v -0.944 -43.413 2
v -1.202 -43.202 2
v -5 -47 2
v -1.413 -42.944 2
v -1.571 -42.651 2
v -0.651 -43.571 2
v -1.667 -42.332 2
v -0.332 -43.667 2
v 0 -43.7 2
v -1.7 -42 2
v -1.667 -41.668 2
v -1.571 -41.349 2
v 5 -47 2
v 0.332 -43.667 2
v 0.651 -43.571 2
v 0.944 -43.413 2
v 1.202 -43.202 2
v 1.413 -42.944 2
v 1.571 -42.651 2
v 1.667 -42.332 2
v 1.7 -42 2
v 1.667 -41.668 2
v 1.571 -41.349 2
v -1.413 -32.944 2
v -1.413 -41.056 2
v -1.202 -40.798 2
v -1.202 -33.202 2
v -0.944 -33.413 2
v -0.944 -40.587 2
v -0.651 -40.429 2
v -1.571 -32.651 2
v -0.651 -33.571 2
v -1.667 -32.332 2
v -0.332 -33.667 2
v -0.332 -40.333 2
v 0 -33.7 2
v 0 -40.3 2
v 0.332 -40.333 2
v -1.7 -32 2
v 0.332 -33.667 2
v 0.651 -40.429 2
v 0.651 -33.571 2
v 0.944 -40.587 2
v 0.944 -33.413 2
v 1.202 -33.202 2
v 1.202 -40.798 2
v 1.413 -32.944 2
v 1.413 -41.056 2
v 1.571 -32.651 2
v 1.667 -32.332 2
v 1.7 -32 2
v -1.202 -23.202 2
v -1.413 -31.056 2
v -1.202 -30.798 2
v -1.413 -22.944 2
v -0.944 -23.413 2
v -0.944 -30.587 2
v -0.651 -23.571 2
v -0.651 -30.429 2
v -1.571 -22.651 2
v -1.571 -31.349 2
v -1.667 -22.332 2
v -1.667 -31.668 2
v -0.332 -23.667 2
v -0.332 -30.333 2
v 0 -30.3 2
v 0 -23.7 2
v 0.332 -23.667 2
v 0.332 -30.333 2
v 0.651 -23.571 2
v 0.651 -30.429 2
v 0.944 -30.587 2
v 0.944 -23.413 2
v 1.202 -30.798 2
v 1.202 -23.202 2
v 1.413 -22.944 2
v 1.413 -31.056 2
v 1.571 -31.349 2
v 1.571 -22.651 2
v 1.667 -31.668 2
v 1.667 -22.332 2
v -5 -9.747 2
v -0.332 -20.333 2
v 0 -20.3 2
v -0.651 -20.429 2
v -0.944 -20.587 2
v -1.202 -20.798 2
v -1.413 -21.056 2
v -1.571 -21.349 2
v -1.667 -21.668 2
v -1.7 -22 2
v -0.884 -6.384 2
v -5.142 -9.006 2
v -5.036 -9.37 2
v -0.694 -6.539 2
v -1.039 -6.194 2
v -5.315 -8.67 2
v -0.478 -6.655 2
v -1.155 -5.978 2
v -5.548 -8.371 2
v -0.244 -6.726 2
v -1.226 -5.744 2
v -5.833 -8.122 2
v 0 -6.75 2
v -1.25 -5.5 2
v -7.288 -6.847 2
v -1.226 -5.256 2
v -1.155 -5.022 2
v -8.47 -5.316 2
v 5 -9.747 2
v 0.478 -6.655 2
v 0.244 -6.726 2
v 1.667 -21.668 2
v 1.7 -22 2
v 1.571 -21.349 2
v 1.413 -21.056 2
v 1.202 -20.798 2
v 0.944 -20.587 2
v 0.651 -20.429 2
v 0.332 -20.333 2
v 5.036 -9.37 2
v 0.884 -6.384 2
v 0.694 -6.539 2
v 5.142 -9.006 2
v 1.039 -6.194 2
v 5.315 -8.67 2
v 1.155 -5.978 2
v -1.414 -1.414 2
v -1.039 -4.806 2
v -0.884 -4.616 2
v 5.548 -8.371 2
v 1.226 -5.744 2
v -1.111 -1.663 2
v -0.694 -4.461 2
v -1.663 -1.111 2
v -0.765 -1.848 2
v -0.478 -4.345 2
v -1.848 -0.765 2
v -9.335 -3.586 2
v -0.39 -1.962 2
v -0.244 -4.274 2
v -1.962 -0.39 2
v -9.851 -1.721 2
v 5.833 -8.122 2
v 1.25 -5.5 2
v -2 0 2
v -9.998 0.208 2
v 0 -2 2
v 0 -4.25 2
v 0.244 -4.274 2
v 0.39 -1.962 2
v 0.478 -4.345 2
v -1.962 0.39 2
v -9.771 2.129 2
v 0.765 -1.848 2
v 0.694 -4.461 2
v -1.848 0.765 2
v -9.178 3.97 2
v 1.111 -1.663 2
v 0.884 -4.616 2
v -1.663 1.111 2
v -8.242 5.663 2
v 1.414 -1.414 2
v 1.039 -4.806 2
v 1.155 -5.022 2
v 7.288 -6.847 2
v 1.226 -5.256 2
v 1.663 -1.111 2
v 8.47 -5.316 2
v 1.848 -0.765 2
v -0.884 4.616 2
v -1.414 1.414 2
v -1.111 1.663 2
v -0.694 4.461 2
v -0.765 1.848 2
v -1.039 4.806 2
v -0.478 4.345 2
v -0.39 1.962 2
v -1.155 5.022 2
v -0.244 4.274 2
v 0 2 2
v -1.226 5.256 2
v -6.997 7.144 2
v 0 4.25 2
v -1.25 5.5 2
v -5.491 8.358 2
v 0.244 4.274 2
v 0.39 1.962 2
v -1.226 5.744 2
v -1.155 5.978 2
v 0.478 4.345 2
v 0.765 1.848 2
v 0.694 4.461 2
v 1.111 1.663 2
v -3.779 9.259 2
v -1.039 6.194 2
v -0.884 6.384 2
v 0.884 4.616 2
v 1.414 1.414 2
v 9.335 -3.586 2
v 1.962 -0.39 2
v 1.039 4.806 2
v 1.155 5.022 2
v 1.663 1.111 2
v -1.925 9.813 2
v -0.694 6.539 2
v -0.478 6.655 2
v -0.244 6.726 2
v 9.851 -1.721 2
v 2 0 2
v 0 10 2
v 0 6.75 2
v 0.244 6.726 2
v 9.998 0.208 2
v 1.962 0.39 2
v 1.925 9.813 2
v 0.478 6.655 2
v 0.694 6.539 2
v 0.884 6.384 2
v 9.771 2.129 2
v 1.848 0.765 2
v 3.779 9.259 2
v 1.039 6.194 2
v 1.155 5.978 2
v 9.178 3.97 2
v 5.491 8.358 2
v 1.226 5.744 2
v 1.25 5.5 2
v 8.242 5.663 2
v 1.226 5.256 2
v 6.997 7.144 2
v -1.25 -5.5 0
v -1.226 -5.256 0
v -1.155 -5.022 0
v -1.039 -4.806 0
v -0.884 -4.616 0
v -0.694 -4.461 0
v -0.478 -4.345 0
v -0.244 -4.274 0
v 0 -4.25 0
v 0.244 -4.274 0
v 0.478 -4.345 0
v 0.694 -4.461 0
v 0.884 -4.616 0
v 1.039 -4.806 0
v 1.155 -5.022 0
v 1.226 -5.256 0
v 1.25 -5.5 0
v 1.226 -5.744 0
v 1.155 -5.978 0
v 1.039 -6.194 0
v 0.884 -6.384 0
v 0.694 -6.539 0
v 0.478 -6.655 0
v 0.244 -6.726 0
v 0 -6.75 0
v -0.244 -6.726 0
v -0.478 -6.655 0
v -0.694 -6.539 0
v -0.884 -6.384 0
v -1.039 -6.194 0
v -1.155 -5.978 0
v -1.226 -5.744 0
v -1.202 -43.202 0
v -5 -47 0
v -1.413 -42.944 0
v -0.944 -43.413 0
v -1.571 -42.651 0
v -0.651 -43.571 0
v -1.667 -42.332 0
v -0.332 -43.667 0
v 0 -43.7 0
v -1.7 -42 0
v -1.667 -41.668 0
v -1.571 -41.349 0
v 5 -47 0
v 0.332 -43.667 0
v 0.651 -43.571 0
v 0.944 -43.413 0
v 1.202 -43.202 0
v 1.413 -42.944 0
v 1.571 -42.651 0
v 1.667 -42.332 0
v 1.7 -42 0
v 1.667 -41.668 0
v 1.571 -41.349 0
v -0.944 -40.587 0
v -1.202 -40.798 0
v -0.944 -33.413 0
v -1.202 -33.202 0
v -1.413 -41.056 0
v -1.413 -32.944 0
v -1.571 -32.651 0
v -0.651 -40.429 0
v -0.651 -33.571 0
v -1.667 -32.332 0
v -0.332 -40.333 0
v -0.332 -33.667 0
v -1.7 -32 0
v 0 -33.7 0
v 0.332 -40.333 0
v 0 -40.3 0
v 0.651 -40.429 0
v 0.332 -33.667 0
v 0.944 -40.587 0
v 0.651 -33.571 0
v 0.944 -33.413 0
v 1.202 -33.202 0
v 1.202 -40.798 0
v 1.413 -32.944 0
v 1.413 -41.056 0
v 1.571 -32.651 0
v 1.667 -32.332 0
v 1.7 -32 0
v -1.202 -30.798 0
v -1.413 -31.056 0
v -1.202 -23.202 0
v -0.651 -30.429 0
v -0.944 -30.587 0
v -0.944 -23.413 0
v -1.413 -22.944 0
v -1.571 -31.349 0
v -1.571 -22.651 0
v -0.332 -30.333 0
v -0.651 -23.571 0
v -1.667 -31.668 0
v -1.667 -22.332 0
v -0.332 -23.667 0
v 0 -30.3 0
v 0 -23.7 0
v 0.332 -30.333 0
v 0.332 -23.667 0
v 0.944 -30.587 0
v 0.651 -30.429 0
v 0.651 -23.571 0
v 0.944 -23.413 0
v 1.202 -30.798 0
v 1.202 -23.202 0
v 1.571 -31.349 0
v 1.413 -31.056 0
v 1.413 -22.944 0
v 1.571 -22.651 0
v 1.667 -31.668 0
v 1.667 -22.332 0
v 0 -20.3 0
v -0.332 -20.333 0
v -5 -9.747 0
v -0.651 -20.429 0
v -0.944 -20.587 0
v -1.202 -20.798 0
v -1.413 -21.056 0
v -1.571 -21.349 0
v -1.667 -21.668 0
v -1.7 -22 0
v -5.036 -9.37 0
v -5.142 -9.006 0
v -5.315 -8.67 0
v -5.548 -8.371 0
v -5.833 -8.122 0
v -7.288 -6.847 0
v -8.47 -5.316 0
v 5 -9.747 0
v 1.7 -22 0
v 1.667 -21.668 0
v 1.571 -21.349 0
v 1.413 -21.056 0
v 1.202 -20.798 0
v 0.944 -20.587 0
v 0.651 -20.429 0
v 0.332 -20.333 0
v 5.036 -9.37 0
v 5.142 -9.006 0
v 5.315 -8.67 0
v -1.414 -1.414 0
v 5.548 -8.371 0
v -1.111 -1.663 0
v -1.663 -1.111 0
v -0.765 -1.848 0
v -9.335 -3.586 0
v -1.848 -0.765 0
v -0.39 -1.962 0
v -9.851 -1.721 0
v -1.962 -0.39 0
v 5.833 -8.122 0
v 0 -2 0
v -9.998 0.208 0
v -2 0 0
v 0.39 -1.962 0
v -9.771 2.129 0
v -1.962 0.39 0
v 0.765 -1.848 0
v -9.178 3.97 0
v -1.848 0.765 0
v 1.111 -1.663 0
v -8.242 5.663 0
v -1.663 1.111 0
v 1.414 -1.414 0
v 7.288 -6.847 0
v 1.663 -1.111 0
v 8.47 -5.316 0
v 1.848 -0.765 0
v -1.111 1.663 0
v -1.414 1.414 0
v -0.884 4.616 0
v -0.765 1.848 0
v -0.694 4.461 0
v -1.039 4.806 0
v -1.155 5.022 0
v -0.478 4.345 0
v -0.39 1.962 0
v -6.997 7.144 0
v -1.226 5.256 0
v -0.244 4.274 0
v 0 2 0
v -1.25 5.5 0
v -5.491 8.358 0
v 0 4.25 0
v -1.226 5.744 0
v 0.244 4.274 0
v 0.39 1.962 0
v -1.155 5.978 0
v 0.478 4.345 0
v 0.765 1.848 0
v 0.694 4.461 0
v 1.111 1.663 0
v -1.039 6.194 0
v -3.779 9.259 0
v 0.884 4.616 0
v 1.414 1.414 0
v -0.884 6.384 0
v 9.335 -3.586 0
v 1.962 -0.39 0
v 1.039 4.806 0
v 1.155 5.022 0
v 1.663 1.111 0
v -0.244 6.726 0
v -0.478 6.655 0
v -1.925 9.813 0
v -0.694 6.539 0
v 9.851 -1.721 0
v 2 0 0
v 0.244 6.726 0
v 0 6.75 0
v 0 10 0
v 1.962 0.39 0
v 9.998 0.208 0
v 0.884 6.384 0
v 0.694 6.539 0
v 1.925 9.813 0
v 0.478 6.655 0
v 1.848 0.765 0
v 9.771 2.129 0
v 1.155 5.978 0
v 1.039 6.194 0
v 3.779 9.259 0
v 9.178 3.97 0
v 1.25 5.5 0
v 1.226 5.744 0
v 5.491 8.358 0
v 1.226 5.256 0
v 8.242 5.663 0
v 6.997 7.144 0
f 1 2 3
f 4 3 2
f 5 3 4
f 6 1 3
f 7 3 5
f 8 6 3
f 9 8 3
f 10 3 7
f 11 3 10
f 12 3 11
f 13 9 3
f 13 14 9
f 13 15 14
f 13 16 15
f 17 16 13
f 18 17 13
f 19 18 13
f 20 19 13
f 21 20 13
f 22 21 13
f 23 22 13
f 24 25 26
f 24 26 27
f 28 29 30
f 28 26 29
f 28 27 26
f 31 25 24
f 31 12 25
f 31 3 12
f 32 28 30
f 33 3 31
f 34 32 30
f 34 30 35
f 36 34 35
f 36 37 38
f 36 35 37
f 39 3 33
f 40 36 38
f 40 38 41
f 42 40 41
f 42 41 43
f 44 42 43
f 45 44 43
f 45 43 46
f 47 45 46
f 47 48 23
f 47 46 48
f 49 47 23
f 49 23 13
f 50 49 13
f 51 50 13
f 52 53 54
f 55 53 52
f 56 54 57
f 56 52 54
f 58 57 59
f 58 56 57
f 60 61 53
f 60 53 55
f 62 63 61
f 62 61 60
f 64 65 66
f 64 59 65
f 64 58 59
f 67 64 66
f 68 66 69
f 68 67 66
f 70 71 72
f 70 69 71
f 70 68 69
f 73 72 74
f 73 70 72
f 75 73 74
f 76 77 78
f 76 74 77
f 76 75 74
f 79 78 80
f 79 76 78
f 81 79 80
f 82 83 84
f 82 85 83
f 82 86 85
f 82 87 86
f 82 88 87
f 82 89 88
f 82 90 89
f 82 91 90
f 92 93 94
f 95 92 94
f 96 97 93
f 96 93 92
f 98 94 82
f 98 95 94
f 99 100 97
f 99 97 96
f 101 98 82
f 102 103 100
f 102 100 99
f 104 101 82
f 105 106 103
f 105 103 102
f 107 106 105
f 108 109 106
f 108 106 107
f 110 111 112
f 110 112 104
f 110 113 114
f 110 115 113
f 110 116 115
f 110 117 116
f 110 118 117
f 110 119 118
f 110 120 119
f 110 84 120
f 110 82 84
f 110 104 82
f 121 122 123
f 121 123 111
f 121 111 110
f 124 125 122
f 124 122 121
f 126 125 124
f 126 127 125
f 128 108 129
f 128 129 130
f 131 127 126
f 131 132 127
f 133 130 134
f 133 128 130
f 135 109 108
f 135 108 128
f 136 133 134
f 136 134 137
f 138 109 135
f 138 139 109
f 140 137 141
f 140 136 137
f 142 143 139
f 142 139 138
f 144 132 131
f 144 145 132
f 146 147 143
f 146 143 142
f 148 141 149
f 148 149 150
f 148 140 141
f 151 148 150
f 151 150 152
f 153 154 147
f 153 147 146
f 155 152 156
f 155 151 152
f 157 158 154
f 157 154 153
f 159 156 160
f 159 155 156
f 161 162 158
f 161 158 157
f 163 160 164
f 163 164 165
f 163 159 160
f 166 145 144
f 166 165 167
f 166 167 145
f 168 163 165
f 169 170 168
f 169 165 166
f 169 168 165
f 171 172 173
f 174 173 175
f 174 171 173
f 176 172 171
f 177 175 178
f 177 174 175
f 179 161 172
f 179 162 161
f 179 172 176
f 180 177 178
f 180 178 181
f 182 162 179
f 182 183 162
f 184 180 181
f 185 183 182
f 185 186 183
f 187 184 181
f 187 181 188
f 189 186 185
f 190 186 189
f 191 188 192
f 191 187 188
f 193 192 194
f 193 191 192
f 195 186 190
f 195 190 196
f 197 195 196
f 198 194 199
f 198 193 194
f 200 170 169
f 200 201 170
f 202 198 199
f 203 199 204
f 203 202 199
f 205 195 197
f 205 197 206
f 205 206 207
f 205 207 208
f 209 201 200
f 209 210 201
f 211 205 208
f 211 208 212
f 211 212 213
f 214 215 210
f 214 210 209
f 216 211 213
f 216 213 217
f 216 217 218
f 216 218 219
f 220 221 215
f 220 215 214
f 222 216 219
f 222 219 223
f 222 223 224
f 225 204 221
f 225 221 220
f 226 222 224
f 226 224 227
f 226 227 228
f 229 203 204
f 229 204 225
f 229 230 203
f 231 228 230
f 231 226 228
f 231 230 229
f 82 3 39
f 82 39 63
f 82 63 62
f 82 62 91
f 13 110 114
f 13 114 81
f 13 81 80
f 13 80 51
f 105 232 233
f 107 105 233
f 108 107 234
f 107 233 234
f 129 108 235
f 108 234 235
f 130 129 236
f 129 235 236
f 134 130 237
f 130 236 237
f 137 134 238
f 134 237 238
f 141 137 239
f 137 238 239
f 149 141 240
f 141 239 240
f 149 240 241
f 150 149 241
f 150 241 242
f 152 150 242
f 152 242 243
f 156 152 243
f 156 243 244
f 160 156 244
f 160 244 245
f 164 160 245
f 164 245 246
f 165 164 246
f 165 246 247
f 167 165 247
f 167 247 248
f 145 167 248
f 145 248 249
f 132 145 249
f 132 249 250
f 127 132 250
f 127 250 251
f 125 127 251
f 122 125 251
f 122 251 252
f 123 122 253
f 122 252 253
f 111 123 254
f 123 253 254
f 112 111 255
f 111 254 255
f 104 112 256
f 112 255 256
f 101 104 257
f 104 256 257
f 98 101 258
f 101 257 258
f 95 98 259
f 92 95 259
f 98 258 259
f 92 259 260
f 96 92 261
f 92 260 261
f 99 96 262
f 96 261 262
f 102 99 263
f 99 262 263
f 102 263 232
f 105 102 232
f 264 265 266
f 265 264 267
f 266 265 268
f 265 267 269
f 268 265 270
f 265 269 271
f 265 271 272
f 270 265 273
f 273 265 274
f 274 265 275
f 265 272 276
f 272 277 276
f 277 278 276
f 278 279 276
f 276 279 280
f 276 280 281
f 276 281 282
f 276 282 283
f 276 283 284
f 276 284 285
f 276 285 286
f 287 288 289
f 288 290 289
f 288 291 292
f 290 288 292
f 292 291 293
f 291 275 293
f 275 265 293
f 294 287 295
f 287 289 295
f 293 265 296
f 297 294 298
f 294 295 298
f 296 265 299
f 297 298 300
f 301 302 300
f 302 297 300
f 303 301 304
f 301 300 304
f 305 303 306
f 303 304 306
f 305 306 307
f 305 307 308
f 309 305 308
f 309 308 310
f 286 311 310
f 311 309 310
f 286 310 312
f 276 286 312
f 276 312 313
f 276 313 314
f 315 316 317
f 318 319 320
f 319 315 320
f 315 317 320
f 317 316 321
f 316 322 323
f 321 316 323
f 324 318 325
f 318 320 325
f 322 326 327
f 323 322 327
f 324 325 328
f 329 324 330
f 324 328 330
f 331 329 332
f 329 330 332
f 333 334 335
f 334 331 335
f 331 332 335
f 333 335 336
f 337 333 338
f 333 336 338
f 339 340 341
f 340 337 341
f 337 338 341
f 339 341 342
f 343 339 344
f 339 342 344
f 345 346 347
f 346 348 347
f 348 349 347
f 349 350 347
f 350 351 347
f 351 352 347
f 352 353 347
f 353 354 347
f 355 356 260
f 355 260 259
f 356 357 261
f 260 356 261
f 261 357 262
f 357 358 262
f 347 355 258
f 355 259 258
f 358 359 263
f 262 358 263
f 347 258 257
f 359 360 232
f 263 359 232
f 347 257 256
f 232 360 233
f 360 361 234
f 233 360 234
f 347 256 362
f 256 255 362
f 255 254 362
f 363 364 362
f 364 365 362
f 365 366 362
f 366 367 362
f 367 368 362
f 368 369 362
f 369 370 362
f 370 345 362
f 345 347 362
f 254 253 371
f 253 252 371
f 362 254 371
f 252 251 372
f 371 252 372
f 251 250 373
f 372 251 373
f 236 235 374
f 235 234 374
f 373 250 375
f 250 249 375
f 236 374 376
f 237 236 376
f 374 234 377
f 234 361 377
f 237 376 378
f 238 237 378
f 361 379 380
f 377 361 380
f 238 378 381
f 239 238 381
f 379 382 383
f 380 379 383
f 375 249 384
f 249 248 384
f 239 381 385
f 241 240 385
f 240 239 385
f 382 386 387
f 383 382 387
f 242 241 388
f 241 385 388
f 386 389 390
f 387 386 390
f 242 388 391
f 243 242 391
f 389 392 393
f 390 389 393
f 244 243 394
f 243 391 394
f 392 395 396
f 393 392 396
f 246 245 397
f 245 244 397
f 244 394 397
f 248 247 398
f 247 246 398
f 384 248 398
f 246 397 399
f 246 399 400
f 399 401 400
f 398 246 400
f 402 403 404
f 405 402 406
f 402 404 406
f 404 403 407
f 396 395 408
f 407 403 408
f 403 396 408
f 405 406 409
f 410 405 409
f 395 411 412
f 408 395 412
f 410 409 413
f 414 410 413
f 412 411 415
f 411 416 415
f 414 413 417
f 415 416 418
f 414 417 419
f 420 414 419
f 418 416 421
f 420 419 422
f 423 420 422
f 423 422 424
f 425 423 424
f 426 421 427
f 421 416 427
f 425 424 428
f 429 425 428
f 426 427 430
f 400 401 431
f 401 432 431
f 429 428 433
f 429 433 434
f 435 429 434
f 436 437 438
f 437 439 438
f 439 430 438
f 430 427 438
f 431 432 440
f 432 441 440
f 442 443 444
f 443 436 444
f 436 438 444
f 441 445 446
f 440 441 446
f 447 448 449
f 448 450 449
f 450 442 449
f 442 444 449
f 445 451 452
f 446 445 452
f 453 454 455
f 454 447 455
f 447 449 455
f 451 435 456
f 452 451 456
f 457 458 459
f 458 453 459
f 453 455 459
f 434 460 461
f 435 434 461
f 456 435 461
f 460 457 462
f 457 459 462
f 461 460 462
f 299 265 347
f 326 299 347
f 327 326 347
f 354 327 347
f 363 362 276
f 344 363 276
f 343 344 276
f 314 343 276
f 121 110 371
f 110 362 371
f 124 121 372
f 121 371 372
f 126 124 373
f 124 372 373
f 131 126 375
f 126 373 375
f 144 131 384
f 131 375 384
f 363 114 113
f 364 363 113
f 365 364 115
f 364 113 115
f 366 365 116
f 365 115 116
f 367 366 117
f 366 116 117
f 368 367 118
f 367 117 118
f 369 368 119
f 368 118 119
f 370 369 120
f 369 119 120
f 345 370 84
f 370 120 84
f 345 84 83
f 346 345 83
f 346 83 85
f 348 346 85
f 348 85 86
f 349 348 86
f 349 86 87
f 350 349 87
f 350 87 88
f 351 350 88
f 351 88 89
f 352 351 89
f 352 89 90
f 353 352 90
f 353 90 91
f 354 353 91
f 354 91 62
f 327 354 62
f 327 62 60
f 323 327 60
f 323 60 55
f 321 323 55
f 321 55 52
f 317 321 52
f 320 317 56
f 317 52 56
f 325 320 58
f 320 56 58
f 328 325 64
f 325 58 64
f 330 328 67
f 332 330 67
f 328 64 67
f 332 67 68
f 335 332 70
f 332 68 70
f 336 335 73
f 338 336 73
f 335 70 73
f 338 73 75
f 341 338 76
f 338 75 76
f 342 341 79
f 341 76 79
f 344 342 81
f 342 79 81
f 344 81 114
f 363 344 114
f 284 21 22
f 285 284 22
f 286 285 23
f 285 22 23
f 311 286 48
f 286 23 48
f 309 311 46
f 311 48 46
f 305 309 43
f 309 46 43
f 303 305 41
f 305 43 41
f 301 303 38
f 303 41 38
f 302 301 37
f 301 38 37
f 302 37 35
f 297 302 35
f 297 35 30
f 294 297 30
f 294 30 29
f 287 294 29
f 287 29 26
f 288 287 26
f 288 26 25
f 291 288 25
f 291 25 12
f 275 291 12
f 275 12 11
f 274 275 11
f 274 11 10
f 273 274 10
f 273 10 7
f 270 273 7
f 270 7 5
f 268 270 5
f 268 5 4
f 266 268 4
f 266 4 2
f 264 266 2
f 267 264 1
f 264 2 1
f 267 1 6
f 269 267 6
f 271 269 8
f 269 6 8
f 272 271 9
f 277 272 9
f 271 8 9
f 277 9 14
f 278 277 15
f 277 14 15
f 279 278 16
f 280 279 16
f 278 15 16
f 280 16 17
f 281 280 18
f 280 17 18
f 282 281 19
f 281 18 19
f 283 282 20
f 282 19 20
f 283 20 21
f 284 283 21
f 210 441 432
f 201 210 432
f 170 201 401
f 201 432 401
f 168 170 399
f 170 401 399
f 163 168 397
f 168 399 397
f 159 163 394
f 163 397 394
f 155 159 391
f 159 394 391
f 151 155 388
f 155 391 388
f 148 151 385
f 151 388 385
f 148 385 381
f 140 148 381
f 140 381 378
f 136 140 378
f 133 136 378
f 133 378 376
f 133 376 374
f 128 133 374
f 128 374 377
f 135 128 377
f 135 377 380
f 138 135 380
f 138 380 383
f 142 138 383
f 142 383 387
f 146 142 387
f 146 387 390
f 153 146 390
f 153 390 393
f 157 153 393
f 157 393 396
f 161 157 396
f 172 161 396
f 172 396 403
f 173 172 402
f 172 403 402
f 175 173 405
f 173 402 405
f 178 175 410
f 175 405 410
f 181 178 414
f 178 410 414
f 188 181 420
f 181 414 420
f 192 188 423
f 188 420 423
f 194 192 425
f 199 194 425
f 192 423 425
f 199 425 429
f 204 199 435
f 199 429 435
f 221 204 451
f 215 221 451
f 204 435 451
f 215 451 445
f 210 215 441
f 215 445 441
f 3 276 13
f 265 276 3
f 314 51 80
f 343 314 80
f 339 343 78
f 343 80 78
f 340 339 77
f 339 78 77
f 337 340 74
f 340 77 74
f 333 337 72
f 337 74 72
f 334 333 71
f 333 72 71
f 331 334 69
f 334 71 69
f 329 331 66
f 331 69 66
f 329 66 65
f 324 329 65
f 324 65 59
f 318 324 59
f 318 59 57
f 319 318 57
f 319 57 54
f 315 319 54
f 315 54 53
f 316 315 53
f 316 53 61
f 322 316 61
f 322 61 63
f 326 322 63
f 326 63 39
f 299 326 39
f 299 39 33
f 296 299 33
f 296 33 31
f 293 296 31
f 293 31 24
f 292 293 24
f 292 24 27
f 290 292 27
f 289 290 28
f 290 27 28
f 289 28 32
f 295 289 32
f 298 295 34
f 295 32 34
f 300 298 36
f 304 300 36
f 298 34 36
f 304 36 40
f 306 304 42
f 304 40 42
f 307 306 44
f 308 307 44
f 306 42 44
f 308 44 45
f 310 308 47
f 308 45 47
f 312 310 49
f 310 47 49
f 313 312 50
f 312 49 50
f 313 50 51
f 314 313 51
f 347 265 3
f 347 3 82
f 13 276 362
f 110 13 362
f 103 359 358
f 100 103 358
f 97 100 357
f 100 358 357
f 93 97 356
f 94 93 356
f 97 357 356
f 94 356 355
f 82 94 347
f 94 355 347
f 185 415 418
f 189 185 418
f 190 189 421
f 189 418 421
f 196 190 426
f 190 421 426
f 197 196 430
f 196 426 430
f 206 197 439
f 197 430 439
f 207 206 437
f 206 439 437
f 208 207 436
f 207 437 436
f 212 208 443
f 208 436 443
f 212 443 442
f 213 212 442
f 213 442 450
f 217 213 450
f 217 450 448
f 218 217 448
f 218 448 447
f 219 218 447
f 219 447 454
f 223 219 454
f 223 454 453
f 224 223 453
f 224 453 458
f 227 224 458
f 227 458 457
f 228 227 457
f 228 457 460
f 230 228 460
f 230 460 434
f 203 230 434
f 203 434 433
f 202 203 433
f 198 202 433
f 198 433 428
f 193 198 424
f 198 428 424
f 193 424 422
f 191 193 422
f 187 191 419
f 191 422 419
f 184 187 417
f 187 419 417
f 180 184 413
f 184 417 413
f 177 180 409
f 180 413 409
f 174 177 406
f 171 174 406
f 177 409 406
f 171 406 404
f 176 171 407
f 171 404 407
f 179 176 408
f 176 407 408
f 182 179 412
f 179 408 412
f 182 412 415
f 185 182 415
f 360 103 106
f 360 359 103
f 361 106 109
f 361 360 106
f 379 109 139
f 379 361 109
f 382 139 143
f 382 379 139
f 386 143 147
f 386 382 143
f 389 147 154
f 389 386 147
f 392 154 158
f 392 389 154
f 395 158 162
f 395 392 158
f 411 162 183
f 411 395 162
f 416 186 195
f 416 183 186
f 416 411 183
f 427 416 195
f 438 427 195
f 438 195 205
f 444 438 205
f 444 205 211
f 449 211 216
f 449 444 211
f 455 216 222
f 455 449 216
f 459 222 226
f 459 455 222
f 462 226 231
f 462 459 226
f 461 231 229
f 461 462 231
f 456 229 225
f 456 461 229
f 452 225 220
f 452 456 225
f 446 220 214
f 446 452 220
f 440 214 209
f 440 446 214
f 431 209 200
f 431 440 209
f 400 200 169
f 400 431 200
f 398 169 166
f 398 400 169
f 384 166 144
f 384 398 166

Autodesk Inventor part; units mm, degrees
ref_plane "YZ Plane" through (0, 0, 0) normal (1, 0, 0) x (0, 1, 0)
ref_plane "XZ Plane" through (0, 0, 0) normal (0, 1, 0) x (-1, 0, 0)
ref_plane "XY Plane" through (0, 0, 0) normal (0, 0, 1) x (1, 0, 0)
sketch "スケッチ1" plane through (0, 0, 0) normal (0, 0, 1) x (1, 0, 0)
  circle A0 centre (0, 0) radius 10
  circle A1 centre (0, 0) radius 2
  line L0 (0, -2) -> (0, -47)
  line L1 (10, 0) -> (10, -47)
  line L2 (10, -47) -> (-10, -47)
  line L3 (-10, -47) -> (-10, 0)
  circle A2 centre (0, -32) radius 1
  circle A3 centre (0, -42) radius 1
  circle A4 centre (0, -22) radius 1
  dimension "d1" = 4
  dimension "d0" = 20
  dimension "d2" = 45
  dimension "d9" = 2
  dimension "d10" = 2
  dimension "d11" = 2
  dimension "d31" = 10
  dimension "d32" = 22
extrude "押し出し1" add sketch "スケッチ1" along normal blind 2
sketch "スケッチ2" plane through (0, 0, 2) normal (0, 0, 1) x (1, 0, 0)
  circle A0 centre (0, -32) radius 1.7
  circle A1 centre (0, -22) radius 1.7
  circle A2 centre (0, -42) radius 1.7
  point P0 (0, 0)
  dimension "d12" = 3.4
  dimension "d13" = 3.4
  dimension "d14" = 3.4
extrude "押し出し2" cut sketch "スケッチ2" against normal blind 10
sketch "スケッチ3" plane through (0, 0, 0) normal (0, 0, -1) x (-1, 0, 0)
  line L0 (10, -47) -> (-10, -47) projected
  line L1 (10, -47) -> (5, -47)
  circle A0 centre (0, 0) radius 10
  line L2 (5, -47) -> (5, -8.6603)
  line L3 (10, 0) -> (10, -47) projected
  line L4 (10, -47) -> (10, 0)
  line L5 (-10, -47) -> (-10, 0) projected
  line L6 (-10, 0) -> (-10, -47)
  line L7 (-10, -47) -> (-5, -47)
  line L8 (-5, -47) -> (-5, -8.6603)
  dimension "d17" = 5
  dimension "d18" = 5
extrude "押し出し3" cut sketch "スケッチ3" against normal blind 10 contours L0 L2 A0 L3 | L0 L5 A0 L8
sketch "スケッチ4" plane through (0, 0, 0) normal (0, 0, -1) x (-1, 0, 0)
  circle A0 centre (0, 0) radius 5.5
  circle A1 centre (0, -5.5) radius 1.25
  circle A2 centre (0, 5.5) radius 1.25
  dimension "d21" = 11
  dimension "d22" = 2.5
  dimension "d23" = 2.5
extrude "押し出し4" cut sketch "スケッチ4" against normal blind 10 contours A2 A0 | A0 A2 | A1 A0 | A0 A1
fillet "フィレット1" radius 2 2 edges at (5, -8.6603, 1) (-5, -8.6603, 1)
properties part number "cutter_board"
